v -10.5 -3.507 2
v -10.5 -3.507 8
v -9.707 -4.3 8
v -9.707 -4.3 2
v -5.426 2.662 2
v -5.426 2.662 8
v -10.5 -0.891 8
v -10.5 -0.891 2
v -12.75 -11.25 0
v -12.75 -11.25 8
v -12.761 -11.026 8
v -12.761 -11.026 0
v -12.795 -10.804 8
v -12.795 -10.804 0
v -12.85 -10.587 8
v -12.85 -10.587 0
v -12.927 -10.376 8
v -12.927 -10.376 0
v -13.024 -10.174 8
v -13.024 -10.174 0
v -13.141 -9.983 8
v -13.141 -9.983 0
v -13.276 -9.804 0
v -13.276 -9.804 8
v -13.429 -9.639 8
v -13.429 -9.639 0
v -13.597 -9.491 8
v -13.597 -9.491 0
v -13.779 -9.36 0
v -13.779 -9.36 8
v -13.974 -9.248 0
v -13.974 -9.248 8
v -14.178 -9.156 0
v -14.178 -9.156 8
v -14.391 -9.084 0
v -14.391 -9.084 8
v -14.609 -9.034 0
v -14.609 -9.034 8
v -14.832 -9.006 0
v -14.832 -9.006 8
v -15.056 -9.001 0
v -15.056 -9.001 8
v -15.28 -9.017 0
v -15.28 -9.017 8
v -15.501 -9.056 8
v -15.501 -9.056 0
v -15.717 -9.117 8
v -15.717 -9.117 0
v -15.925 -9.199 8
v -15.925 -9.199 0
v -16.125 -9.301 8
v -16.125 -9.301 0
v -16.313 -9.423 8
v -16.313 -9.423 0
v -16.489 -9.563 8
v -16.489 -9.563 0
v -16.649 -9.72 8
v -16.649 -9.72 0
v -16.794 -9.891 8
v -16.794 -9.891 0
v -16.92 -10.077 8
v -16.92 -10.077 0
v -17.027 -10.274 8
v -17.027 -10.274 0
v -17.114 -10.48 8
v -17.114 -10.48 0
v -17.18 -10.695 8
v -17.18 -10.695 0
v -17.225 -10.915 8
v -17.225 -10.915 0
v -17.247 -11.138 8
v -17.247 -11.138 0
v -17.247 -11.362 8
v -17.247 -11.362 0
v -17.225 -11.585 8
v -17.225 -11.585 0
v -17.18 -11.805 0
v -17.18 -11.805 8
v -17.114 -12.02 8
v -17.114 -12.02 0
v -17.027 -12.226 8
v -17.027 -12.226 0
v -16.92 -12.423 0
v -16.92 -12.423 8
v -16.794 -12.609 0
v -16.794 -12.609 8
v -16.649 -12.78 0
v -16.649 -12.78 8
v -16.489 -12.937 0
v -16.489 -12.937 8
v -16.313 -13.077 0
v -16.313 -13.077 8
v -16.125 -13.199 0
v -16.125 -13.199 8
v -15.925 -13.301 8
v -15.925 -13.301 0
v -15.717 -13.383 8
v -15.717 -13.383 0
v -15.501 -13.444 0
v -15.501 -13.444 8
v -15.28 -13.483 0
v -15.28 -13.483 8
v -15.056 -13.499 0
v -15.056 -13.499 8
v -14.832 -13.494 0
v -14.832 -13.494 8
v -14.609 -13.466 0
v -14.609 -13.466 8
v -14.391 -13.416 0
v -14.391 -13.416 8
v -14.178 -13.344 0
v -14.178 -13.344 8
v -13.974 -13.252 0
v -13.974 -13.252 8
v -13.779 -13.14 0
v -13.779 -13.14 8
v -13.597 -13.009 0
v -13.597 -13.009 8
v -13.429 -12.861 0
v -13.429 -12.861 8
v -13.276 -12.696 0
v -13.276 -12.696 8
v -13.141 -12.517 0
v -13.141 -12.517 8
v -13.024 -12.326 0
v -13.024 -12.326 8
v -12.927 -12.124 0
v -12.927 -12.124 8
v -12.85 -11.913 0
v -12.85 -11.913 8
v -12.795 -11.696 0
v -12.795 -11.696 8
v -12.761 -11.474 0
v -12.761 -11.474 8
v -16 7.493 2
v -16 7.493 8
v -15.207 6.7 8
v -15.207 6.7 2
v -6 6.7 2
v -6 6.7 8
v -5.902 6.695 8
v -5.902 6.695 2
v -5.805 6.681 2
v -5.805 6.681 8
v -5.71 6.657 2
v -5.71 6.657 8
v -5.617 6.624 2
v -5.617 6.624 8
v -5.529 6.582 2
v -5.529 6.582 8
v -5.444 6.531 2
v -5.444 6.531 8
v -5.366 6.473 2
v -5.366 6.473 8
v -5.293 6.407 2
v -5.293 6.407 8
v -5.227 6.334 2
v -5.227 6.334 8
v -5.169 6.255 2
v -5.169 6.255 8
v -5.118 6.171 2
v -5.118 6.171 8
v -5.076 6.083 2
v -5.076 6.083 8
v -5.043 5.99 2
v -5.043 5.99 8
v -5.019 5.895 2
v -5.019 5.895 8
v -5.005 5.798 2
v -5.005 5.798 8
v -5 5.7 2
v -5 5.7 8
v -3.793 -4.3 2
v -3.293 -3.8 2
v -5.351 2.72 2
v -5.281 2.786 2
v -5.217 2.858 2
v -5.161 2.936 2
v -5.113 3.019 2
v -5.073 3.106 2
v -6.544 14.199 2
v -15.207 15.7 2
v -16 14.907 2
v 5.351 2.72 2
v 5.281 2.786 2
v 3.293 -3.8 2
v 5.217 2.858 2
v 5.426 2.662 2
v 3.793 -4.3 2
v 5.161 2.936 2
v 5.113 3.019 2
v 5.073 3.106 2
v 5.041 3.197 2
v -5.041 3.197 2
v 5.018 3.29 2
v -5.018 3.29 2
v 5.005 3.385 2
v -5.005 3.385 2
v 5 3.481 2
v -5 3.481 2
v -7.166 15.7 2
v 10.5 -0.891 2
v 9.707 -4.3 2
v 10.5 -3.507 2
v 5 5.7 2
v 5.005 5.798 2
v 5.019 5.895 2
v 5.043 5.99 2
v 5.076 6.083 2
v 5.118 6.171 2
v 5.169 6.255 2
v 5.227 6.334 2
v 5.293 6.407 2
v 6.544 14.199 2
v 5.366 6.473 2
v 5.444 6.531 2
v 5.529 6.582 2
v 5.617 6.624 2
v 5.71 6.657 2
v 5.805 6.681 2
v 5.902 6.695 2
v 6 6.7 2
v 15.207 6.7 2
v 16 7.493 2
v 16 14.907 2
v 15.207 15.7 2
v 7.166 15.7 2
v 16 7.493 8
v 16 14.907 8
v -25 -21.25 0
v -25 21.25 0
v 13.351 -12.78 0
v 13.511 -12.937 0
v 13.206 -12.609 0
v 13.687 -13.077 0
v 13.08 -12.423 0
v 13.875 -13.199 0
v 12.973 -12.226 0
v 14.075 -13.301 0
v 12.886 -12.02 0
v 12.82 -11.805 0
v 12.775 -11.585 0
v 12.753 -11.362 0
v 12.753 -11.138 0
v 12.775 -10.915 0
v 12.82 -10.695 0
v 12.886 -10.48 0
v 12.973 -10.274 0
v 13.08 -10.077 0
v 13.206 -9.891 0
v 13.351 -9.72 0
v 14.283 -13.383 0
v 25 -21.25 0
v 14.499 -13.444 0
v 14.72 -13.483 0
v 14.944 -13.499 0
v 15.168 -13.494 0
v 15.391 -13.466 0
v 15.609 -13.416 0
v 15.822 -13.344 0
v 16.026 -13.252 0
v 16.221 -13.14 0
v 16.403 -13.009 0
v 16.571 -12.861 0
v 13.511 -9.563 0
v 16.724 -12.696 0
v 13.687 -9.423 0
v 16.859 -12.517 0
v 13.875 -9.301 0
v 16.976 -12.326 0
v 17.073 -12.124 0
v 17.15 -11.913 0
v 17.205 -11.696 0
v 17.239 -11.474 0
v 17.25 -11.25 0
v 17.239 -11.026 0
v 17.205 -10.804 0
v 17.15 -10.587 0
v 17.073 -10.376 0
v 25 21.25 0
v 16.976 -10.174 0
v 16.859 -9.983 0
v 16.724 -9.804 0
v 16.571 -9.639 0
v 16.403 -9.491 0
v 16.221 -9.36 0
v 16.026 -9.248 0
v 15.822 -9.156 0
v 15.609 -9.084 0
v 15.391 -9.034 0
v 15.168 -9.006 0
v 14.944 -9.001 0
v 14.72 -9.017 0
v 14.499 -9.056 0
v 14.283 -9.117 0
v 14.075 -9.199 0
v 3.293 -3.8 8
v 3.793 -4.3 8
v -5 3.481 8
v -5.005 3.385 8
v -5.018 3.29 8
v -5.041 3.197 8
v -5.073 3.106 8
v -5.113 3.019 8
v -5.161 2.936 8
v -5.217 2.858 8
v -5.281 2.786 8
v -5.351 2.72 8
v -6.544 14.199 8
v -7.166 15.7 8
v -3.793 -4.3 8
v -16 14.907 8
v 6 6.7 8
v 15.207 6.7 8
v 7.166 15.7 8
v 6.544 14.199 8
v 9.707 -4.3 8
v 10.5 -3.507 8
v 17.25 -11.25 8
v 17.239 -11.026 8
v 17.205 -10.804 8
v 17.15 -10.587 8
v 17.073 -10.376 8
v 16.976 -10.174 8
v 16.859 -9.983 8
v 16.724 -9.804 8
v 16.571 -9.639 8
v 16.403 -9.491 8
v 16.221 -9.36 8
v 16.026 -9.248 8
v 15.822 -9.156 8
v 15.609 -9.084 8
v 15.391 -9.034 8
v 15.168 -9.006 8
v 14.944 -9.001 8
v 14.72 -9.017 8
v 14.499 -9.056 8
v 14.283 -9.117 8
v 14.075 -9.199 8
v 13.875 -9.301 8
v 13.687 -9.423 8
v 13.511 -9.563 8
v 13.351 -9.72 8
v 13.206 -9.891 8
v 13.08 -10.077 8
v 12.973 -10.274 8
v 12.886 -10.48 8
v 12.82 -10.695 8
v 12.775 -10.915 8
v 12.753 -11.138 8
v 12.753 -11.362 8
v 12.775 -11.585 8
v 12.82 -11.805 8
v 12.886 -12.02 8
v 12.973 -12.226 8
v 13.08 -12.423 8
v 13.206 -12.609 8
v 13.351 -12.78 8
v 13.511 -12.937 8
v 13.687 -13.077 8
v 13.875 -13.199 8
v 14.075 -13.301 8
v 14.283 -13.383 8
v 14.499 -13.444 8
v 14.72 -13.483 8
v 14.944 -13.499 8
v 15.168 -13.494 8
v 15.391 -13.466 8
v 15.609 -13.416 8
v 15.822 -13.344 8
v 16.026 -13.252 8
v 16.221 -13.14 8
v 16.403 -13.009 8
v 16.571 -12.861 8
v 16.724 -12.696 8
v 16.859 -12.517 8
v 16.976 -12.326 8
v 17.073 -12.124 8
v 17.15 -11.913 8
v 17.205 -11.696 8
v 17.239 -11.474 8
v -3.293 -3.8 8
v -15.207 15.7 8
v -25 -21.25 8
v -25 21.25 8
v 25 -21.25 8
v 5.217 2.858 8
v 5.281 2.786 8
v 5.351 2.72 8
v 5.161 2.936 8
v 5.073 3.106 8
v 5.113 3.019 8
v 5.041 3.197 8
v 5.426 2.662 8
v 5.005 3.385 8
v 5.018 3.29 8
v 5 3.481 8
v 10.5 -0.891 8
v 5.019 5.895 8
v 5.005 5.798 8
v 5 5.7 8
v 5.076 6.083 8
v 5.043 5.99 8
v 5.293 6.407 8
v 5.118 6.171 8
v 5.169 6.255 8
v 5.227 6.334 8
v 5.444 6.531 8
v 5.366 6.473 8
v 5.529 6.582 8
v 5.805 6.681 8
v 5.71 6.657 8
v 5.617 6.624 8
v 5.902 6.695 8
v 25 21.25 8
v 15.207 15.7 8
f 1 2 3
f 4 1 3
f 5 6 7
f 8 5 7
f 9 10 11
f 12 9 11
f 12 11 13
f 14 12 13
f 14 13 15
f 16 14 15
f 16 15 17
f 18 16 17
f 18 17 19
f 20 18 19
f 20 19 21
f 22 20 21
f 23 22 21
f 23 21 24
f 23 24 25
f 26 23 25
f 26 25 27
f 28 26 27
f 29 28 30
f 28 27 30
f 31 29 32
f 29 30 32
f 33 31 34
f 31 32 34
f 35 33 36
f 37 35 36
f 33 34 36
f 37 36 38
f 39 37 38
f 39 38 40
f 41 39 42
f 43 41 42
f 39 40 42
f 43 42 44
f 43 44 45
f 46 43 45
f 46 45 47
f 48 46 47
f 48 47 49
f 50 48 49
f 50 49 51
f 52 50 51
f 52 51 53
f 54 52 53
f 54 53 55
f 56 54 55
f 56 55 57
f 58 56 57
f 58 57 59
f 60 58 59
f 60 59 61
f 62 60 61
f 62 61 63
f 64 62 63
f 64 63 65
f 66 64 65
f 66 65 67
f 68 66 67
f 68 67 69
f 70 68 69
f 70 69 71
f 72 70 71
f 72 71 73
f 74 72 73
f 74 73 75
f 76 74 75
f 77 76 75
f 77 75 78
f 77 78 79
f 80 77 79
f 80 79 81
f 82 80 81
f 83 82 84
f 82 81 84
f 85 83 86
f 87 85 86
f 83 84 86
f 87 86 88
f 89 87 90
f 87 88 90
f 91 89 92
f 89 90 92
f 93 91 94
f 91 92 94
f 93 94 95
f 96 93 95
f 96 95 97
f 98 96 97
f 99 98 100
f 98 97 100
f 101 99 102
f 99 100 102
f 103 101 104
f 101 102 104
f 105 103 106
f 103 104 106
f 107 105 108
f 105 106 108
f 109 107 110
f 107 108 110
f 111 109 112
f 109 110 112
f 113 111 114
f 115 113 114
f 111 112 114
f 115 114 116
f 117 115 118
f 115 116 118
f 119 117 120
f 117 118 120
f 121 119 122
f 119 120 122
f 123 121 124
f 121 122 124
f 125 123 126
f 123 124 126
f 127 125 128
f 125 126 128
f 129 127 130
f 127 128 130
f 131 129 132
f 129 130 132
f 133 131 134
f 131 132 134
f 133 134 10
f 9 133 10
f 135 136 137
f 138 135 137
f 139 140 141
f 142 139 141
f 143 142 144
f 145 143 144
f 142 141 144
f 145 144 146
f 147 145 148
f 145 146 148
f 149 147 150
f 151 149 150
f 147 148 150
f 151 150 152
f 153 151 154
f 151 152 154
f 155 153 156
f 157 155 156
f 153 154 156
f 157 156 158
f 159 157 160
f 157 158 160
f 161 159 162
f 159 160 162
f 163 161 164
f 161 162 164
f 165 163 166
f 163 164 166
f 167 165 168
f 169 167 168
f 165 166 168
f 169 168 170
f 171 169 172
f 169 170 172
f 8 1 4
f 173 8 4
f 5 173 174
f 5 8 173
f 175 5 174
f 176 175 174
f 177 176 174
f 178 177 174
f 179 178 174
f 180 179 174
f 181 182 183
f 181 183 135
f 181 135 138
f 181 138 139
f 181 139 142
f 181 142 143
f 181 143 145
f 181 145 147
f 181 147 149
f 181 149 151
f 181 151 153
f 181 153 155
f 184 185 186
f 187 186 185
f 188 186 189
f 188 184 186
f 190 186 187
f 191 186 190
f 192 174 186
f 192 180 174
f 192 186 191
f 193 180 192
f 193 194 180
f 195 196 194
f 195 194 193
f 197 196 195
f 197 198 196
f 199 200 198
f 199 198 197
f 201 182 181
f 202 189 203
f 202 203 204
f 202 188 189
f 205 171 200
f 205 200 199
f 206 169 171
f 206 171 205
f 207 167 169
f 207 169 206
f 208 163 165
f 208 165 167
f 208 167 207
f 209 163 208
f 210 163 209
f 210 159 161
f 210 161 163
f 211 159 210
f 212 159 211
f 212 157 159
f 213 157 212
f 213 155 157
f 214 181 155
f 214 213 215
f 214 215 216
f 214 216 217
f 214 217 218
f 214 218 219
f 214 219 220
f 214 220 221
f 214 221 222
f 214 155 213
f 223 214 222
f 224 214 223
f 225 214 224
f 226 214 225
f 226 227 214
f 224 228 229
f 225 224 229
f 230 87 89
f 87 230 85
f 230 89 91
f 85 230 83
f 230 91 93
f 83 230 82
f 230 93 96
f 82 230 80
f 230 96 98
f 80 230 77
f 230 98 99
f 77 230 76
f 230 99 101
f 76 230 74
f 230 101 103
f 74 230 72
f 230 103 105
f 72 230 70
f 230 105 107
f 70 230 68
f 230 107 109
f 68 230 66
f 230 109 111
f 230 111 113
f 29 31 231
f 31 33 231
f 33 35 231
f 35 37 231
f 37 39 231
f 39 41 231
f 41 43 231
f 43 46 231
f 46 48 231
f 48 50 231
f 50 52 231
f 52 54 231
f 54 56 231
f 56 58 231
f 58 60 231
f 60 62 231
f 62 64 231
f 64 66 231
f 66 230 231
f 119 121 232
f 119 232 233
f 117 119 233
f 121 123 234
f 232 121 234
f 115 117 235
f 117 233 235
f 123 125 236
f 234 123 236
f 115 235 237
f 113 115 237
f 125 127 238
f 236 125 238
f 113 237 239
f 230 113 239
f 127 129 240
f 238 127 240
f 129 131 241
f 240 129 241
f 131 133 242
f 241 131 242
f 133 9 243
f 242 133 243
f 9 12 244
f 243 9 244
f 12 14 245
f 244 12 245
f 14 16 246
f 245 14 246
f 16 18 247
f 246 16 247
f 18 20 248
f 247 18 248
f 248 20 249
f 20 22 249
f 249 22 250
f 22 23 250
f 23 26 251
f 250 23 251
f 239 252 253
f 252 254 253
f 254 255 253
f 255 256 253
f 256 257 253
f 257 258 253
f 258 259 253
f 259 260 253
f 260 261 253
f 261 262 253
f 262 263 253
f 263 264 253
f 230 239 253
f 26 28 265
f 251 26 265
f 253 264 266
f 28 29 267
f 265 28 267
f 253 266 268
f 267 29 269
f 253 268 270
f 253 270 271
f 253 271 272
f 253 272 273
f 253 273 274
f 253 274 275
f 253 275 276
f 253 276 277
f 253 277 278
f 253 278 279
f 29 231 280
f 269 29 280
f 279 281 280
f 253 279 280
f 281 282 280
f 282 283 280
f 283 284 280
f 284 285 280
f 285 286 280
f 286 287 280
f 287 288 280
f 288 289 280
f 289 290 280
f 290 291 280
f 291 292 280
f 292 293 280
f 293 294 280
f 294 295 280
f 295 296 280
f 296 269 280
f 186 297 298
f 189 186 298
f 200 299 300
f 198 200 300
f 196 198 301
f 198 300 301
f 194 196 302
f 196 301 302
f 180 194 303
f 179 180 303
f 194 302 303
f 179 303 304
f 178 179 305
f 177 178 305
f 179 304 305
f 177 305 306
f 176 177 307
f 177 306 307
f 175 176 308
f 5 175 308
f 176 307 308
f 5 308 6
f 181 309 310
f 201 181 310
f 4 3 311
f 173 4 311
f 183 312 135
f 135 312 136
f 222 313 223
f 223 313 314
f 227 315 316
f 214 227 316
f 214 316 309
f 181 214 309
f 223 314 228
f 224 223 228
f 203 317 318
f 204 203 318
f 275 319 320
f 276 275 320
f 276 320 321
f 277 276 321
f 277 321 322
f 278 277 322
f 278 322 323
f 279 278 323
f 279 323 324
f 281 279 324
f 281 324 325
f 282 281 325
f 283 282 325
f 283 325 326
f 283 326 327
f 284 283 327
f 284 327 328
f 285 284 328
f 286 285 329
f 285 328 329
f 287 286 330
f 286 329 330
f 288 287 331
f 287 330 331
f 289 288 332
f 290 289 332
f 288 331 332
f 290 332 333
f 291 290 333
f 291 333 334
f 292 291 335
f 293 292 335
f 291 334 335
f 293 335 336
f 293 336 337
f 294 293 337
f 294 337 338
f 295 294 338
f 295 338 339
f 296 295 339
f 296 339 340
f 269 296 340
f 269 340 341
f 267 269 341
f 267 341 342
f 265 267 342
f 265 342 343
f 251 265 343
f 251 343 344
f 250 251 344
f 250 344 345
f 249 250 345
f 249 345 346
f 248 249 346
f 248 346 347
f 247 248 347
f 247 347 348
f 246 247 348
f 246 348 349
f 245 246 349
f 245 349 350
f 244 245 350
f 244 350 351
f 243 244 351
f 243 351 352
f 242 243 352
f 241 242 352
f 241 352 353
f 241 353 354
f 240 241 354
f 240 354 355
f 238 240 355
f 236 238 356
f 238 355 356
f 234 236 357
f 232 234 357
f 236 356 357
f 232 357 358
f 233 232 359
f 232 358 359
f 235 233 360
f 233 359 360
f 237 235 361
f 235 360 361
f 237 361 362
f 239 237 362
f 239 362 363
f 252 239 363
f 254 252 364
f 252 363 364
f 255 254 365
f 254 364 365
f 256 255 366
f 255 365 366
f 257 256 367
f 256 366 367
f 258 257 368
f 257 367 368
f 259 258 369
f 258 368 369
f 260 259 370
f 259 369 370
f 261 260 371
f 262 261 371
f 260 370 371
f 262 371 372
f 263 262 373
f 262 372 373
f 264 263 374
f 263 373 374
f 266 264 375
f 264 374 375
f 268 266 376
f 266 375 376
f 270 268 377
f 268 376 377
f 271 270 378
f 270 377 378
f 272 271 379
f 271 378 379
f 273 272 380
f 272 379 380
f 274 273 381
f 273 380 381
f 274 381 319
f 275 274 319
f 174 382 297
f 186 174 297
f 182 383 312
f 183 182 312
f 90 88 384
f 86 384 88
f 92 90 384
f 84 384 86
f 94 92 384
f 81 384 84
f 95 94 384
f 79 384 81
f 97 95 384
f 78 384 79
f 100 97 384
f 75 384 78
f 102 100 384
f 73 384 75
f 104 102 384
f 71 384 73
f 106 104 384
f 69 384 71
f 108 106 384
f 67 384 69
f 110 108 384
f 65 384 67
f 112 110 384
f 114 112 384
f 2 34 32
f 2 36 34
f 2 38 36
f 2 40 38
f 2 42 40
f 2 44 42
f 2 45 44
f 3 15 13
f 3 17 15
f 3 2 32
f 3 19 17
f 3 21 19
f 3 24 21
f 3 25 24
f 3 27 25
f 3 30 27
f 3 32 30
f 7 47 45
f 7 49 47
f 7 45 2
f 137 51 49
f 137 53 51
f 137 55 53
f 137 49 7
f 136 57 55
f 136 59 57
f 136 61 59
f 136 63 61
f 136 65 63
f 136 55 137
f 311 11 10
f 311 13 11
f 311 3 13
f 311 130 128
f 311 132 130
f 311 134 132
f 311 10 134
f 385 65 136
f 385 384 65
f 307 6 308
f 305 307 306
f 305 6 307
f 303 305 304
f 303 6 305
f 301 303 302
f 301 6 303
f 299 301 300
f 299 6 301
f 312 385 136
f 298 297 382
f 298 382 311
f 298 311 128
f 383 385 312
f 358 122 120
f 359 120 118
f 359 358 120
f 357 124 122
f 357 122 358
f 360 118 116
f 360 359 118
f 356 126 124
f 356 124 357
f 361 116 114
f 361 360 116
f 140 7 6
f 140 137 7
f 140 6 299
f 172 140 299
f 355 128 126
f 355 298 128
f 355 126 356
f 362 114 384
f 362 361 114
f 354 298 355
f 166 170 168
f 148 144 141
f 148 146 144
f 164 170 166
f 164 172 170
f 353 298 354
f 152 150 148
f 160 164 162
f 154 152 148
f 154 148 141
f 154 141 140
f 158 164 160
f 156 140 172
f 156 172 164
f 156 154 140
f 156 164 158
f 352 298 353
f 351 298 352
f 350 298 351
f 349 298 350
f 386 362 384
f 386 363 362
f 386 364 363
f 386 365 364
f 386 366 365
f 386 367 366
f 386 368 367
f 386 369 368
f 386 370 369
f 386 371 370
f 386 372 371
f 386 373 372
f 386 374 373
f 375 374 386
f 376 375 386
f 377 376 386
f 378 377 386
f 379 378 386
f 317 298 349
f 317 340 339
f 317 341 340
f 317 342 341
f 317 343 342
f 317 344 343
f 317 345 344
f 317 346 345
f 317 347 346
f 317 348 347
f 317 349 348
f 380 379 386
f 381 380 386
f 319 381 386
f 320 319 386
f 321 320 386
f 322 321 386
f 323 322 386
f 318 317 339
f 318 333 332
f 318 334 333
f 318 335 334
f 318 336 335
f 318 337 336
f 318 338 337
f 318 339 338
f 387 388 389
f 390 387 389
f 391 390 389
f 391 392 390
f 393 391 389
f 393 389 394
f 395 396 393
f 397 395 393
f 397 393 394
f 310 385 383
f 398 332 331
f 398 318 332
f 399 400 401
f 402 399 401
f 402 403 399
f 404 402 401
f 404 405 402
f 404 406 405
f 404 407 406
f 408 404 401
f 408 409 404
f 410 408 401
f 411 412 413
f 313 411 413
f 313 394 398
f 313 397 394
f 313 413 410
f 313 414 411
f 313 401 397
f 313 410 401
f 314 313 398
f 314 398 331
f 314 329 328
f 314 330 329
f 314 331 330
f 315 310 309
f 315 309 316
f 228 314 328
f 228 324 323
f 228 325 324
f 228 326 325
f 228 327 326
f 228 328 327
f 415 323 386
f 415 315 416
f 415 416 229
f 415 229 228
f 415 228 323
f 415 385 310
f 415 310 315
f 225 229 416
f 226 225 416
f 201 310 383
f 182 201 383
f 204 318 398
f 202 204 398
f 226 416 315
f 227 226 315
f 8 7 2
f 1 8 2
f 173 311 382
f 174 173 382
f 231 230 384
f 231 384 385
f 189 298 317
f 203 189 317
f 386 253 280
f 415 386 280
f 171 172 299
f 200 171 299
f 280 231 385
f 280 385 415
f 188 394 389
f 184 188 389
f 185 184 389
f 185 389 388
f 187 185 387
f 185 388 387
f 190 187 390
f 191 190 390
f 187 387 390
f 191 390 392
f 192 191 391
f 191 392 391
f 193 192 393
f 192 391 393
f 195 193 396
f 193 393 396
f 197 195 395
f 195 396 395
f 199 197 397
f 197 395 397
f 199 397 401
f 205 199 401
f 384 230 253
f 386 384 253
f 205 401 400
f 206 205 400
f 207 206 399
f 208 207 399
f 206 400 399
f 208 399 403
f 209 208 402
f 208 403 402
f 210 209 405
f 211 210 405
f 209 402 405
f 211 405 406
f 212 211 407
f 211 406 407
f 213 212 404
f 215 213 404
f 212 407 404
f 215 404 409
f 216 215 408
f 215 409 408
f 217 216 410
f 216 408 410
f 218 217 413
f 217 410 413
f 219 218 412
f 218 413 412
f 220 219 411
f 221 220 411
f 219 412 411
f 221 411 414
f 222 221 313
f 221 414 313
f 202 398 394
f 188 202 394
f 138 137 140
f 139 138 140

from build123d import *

# Parameters (mm, degrees)
SKETCH1_W           = 50
SKETCH1_H           = 42.5
BOSS_EXTRUDE1_DEPTH = 8
CUT_EXTRUDE1_DEPTH  = 6
SKETCH3_R           = 2.25
CUT_EXTRUDE2_DEPTH  = 34.772214911


with BuildPart() as part:
    # Sketch1 → Boss-Extrude1 (new body)
    with BuildSketch(Plane.XY):
        Rectangle(SKETCH1_W, SKETCH1_H)
    extrude(amount=BOSS_EXTRUDE1_DEPTH)

    # Sketch2 → Cut-Extrude1 (cut)
    with BuildSketch(Plane.XY.offset(8)):
        with BuildLine():
            Line((-3.292893219, -3.8), (3.292893219, -3.8))
            Line((3.292893219, -3.8), (3.792817713, -4.299924494))
            Line((3.792817713, -4.299924494), (9.707031275, -4.299924494))
            Line((9.707031275, -4.299924494), (10.499848989, -3.507106781))
            Line((10.499848989, -3.507106781), (10.499848989, -0.890716475))
            Line((10.499848989, -0.890716475), (5.426401458, 2.661749731))
            ThreePointArc((5.426401458, 2.661749731), (5.112967061, 3.019153162), (4.999977894, 3.480901775))
            Line((4.999977894, 3.480901775), (4.999977894, 5.699901775))
            ThreePointArc((4.999977894, 5.699901775), (5.292871113, 6.407008557), (5.999977894, 6.699901775))
            Line((5.999977894, 6.699901775), (15.207084675, 6.699901775))
            Line((15.207084675, 6.699901775), (15.999902388, 7.492719488))
            Line((15.999902388, 7.492719488), (15.999902388, 14.906933051))
            Line((15.999902388, 14.906933051), (15.207084675, 15.699750764))
            Line((15.207084675, 15.699750764), (7.165888575, 15.699750764))
            Line((7.165888575, 15.699750764), (6.544410681, 14.199370403))
            Line((6.544410681, 14.199370403), (-6.544410681, 14.199370403))
            Line((-6.544410681, 14.199370403), (-7.165888575, 15.699750764))
            Line((-7.165888575, 15.699750764), (-15.207084675, 15.699750764))
            Line((-15.207084675, 15.699750764), (-15.999902388, 14.906933051))
            Line((-15.999902388, 14.906933051), (-15.999902388, 7.492719488))
            Line((-15.999902388, 7.492719488), (-15.207084675, 6.699901775))
            Line((-15.207084675, 6.699901775), (-5.999977894, 6.699901775))
            ThreePointArc((-5.999977894, 6.699901775), (-5.292871113, 6.407008557), (-4.999977894, 5.699901775))
            Line((-4.999977894, 5.699901775), (-4.999977894, 3.480901775))
            ThreePointArc((-4.999977894, 3.480901775), (-5.112967061, 3.019153162), (-5.426401458, 2.661749731))
            Line((-5.426401458, 2.661749731), (-10.499848989, -0.890716475))
            Line((-10.499848989, -0.890716475), (-10.499848989, -3.507106781))
            Line((-10.499848989, -3.507106781), (-9.707031275, -4.299924494))
            Line((-9.707031275, -4.299924494), (-3.792817713, -4.299924494))
            Line((-3.792817713, -4.299924494), (-3.292893219, -3.8))
        make_face()
    extrude(amount=-CUT_EXTRUDE1_DEPTH, mode=Mode.SUBTRACT)

    # Sketch3 → Cut-Extrude2 (cut, through all)
    with BuildSketch(Plane.XY.offset(8)):
        with Locations((-15, -11.25)):
            Circle(SKETCH3_R)
        with Locations((15, -11.25)):
            Circle(SKETCH3_R)
    extrude(amount=-CUT_EXTRUDE2_DEPTH, mode=Mode.SUBTRACT)


solid = part.part
